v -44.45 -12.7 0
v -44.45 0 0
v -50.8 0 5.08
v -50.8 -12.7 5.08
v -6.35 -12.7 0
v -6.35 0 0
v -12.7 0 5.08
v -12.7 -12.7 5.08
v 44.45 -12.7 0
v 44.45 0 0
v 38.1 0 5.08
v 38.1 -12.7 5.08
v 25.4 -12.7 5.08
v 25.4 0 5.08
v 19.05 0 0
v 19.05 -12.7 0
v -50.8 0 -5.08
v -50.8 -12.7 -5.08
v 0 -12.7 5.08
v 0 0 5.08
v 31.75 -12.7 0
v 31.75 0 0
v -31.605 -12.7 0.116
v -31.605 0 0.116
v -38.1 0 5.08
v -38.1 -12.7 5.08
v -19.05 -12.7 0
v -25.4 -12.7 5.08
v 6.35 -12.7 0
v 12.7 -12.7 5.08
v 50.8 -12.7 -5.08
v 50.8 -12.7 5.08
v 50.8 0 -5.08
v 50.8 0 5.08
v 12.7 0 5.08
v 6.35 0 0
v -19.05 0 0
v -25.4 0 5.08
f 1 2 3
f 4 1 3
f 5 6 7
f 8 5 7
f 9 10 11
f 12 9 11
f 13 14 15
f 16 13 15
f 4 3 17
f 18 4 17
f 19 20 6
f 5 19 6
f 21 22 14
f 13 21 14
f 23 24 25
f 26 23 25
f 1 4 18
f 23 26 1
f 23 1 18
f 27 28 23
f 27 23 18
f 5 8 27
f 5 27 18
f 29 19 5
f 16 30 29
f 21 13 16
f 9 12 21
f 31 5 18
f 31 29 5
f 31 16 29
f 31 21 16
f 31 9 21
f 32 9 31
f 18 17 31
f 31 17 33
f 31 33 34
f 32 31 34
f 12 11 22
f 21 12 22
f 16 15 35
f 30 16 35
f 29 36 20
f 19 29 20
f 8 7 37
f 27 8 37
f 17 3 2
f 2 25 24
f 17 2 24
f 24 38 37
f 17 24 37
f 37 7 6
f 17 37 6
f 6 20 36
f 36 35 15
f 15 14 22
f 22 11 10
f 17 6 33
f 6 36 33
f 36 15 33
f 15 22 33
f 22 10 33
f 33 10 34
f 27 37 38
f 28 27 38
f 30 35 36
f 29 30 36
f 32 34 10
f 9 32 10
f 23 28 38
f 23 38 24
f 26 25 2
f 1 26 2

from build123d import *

# Parameters (mm, degrees)
F1_DEPTH = 6.35
F2_SCALE = 2


with BuildPart() as f1:
    # F0 (on Front) → F1 (new body)
    with BuildSketch(Plane.XZ):
        Polygon((19.05, -2.54), (25.4, -2.54), (25.4, 2.54), (22.225, 0), (19.05, 2.54), (15.875, 0), (12.7, 2.54), (9.525, 0), (6.35, 2.54), (3.175, 0), (0, 2.54), (-3.175, 0), (-6.35, 2.54), (-9.525, 0), (-12.7, 2.54), (-15.8026084123, 0.0579132702), (-19.05, 2.54), (-22.225, 0), (-25.4, 2.54), (-25.4, -2.54), (-19.05, -2.54), (-12.7, -2.54), (-6.35, -2.54), (0, -2.54), (6.35, -2.54), (12.7, -2.54), align=None)
    extrude(amount=F1_DEPTH)


with BuildPart() as f1_1:
    # F2: moved
    add(f1.part.scale(F2_SCALE))


solid = f1_1.part
